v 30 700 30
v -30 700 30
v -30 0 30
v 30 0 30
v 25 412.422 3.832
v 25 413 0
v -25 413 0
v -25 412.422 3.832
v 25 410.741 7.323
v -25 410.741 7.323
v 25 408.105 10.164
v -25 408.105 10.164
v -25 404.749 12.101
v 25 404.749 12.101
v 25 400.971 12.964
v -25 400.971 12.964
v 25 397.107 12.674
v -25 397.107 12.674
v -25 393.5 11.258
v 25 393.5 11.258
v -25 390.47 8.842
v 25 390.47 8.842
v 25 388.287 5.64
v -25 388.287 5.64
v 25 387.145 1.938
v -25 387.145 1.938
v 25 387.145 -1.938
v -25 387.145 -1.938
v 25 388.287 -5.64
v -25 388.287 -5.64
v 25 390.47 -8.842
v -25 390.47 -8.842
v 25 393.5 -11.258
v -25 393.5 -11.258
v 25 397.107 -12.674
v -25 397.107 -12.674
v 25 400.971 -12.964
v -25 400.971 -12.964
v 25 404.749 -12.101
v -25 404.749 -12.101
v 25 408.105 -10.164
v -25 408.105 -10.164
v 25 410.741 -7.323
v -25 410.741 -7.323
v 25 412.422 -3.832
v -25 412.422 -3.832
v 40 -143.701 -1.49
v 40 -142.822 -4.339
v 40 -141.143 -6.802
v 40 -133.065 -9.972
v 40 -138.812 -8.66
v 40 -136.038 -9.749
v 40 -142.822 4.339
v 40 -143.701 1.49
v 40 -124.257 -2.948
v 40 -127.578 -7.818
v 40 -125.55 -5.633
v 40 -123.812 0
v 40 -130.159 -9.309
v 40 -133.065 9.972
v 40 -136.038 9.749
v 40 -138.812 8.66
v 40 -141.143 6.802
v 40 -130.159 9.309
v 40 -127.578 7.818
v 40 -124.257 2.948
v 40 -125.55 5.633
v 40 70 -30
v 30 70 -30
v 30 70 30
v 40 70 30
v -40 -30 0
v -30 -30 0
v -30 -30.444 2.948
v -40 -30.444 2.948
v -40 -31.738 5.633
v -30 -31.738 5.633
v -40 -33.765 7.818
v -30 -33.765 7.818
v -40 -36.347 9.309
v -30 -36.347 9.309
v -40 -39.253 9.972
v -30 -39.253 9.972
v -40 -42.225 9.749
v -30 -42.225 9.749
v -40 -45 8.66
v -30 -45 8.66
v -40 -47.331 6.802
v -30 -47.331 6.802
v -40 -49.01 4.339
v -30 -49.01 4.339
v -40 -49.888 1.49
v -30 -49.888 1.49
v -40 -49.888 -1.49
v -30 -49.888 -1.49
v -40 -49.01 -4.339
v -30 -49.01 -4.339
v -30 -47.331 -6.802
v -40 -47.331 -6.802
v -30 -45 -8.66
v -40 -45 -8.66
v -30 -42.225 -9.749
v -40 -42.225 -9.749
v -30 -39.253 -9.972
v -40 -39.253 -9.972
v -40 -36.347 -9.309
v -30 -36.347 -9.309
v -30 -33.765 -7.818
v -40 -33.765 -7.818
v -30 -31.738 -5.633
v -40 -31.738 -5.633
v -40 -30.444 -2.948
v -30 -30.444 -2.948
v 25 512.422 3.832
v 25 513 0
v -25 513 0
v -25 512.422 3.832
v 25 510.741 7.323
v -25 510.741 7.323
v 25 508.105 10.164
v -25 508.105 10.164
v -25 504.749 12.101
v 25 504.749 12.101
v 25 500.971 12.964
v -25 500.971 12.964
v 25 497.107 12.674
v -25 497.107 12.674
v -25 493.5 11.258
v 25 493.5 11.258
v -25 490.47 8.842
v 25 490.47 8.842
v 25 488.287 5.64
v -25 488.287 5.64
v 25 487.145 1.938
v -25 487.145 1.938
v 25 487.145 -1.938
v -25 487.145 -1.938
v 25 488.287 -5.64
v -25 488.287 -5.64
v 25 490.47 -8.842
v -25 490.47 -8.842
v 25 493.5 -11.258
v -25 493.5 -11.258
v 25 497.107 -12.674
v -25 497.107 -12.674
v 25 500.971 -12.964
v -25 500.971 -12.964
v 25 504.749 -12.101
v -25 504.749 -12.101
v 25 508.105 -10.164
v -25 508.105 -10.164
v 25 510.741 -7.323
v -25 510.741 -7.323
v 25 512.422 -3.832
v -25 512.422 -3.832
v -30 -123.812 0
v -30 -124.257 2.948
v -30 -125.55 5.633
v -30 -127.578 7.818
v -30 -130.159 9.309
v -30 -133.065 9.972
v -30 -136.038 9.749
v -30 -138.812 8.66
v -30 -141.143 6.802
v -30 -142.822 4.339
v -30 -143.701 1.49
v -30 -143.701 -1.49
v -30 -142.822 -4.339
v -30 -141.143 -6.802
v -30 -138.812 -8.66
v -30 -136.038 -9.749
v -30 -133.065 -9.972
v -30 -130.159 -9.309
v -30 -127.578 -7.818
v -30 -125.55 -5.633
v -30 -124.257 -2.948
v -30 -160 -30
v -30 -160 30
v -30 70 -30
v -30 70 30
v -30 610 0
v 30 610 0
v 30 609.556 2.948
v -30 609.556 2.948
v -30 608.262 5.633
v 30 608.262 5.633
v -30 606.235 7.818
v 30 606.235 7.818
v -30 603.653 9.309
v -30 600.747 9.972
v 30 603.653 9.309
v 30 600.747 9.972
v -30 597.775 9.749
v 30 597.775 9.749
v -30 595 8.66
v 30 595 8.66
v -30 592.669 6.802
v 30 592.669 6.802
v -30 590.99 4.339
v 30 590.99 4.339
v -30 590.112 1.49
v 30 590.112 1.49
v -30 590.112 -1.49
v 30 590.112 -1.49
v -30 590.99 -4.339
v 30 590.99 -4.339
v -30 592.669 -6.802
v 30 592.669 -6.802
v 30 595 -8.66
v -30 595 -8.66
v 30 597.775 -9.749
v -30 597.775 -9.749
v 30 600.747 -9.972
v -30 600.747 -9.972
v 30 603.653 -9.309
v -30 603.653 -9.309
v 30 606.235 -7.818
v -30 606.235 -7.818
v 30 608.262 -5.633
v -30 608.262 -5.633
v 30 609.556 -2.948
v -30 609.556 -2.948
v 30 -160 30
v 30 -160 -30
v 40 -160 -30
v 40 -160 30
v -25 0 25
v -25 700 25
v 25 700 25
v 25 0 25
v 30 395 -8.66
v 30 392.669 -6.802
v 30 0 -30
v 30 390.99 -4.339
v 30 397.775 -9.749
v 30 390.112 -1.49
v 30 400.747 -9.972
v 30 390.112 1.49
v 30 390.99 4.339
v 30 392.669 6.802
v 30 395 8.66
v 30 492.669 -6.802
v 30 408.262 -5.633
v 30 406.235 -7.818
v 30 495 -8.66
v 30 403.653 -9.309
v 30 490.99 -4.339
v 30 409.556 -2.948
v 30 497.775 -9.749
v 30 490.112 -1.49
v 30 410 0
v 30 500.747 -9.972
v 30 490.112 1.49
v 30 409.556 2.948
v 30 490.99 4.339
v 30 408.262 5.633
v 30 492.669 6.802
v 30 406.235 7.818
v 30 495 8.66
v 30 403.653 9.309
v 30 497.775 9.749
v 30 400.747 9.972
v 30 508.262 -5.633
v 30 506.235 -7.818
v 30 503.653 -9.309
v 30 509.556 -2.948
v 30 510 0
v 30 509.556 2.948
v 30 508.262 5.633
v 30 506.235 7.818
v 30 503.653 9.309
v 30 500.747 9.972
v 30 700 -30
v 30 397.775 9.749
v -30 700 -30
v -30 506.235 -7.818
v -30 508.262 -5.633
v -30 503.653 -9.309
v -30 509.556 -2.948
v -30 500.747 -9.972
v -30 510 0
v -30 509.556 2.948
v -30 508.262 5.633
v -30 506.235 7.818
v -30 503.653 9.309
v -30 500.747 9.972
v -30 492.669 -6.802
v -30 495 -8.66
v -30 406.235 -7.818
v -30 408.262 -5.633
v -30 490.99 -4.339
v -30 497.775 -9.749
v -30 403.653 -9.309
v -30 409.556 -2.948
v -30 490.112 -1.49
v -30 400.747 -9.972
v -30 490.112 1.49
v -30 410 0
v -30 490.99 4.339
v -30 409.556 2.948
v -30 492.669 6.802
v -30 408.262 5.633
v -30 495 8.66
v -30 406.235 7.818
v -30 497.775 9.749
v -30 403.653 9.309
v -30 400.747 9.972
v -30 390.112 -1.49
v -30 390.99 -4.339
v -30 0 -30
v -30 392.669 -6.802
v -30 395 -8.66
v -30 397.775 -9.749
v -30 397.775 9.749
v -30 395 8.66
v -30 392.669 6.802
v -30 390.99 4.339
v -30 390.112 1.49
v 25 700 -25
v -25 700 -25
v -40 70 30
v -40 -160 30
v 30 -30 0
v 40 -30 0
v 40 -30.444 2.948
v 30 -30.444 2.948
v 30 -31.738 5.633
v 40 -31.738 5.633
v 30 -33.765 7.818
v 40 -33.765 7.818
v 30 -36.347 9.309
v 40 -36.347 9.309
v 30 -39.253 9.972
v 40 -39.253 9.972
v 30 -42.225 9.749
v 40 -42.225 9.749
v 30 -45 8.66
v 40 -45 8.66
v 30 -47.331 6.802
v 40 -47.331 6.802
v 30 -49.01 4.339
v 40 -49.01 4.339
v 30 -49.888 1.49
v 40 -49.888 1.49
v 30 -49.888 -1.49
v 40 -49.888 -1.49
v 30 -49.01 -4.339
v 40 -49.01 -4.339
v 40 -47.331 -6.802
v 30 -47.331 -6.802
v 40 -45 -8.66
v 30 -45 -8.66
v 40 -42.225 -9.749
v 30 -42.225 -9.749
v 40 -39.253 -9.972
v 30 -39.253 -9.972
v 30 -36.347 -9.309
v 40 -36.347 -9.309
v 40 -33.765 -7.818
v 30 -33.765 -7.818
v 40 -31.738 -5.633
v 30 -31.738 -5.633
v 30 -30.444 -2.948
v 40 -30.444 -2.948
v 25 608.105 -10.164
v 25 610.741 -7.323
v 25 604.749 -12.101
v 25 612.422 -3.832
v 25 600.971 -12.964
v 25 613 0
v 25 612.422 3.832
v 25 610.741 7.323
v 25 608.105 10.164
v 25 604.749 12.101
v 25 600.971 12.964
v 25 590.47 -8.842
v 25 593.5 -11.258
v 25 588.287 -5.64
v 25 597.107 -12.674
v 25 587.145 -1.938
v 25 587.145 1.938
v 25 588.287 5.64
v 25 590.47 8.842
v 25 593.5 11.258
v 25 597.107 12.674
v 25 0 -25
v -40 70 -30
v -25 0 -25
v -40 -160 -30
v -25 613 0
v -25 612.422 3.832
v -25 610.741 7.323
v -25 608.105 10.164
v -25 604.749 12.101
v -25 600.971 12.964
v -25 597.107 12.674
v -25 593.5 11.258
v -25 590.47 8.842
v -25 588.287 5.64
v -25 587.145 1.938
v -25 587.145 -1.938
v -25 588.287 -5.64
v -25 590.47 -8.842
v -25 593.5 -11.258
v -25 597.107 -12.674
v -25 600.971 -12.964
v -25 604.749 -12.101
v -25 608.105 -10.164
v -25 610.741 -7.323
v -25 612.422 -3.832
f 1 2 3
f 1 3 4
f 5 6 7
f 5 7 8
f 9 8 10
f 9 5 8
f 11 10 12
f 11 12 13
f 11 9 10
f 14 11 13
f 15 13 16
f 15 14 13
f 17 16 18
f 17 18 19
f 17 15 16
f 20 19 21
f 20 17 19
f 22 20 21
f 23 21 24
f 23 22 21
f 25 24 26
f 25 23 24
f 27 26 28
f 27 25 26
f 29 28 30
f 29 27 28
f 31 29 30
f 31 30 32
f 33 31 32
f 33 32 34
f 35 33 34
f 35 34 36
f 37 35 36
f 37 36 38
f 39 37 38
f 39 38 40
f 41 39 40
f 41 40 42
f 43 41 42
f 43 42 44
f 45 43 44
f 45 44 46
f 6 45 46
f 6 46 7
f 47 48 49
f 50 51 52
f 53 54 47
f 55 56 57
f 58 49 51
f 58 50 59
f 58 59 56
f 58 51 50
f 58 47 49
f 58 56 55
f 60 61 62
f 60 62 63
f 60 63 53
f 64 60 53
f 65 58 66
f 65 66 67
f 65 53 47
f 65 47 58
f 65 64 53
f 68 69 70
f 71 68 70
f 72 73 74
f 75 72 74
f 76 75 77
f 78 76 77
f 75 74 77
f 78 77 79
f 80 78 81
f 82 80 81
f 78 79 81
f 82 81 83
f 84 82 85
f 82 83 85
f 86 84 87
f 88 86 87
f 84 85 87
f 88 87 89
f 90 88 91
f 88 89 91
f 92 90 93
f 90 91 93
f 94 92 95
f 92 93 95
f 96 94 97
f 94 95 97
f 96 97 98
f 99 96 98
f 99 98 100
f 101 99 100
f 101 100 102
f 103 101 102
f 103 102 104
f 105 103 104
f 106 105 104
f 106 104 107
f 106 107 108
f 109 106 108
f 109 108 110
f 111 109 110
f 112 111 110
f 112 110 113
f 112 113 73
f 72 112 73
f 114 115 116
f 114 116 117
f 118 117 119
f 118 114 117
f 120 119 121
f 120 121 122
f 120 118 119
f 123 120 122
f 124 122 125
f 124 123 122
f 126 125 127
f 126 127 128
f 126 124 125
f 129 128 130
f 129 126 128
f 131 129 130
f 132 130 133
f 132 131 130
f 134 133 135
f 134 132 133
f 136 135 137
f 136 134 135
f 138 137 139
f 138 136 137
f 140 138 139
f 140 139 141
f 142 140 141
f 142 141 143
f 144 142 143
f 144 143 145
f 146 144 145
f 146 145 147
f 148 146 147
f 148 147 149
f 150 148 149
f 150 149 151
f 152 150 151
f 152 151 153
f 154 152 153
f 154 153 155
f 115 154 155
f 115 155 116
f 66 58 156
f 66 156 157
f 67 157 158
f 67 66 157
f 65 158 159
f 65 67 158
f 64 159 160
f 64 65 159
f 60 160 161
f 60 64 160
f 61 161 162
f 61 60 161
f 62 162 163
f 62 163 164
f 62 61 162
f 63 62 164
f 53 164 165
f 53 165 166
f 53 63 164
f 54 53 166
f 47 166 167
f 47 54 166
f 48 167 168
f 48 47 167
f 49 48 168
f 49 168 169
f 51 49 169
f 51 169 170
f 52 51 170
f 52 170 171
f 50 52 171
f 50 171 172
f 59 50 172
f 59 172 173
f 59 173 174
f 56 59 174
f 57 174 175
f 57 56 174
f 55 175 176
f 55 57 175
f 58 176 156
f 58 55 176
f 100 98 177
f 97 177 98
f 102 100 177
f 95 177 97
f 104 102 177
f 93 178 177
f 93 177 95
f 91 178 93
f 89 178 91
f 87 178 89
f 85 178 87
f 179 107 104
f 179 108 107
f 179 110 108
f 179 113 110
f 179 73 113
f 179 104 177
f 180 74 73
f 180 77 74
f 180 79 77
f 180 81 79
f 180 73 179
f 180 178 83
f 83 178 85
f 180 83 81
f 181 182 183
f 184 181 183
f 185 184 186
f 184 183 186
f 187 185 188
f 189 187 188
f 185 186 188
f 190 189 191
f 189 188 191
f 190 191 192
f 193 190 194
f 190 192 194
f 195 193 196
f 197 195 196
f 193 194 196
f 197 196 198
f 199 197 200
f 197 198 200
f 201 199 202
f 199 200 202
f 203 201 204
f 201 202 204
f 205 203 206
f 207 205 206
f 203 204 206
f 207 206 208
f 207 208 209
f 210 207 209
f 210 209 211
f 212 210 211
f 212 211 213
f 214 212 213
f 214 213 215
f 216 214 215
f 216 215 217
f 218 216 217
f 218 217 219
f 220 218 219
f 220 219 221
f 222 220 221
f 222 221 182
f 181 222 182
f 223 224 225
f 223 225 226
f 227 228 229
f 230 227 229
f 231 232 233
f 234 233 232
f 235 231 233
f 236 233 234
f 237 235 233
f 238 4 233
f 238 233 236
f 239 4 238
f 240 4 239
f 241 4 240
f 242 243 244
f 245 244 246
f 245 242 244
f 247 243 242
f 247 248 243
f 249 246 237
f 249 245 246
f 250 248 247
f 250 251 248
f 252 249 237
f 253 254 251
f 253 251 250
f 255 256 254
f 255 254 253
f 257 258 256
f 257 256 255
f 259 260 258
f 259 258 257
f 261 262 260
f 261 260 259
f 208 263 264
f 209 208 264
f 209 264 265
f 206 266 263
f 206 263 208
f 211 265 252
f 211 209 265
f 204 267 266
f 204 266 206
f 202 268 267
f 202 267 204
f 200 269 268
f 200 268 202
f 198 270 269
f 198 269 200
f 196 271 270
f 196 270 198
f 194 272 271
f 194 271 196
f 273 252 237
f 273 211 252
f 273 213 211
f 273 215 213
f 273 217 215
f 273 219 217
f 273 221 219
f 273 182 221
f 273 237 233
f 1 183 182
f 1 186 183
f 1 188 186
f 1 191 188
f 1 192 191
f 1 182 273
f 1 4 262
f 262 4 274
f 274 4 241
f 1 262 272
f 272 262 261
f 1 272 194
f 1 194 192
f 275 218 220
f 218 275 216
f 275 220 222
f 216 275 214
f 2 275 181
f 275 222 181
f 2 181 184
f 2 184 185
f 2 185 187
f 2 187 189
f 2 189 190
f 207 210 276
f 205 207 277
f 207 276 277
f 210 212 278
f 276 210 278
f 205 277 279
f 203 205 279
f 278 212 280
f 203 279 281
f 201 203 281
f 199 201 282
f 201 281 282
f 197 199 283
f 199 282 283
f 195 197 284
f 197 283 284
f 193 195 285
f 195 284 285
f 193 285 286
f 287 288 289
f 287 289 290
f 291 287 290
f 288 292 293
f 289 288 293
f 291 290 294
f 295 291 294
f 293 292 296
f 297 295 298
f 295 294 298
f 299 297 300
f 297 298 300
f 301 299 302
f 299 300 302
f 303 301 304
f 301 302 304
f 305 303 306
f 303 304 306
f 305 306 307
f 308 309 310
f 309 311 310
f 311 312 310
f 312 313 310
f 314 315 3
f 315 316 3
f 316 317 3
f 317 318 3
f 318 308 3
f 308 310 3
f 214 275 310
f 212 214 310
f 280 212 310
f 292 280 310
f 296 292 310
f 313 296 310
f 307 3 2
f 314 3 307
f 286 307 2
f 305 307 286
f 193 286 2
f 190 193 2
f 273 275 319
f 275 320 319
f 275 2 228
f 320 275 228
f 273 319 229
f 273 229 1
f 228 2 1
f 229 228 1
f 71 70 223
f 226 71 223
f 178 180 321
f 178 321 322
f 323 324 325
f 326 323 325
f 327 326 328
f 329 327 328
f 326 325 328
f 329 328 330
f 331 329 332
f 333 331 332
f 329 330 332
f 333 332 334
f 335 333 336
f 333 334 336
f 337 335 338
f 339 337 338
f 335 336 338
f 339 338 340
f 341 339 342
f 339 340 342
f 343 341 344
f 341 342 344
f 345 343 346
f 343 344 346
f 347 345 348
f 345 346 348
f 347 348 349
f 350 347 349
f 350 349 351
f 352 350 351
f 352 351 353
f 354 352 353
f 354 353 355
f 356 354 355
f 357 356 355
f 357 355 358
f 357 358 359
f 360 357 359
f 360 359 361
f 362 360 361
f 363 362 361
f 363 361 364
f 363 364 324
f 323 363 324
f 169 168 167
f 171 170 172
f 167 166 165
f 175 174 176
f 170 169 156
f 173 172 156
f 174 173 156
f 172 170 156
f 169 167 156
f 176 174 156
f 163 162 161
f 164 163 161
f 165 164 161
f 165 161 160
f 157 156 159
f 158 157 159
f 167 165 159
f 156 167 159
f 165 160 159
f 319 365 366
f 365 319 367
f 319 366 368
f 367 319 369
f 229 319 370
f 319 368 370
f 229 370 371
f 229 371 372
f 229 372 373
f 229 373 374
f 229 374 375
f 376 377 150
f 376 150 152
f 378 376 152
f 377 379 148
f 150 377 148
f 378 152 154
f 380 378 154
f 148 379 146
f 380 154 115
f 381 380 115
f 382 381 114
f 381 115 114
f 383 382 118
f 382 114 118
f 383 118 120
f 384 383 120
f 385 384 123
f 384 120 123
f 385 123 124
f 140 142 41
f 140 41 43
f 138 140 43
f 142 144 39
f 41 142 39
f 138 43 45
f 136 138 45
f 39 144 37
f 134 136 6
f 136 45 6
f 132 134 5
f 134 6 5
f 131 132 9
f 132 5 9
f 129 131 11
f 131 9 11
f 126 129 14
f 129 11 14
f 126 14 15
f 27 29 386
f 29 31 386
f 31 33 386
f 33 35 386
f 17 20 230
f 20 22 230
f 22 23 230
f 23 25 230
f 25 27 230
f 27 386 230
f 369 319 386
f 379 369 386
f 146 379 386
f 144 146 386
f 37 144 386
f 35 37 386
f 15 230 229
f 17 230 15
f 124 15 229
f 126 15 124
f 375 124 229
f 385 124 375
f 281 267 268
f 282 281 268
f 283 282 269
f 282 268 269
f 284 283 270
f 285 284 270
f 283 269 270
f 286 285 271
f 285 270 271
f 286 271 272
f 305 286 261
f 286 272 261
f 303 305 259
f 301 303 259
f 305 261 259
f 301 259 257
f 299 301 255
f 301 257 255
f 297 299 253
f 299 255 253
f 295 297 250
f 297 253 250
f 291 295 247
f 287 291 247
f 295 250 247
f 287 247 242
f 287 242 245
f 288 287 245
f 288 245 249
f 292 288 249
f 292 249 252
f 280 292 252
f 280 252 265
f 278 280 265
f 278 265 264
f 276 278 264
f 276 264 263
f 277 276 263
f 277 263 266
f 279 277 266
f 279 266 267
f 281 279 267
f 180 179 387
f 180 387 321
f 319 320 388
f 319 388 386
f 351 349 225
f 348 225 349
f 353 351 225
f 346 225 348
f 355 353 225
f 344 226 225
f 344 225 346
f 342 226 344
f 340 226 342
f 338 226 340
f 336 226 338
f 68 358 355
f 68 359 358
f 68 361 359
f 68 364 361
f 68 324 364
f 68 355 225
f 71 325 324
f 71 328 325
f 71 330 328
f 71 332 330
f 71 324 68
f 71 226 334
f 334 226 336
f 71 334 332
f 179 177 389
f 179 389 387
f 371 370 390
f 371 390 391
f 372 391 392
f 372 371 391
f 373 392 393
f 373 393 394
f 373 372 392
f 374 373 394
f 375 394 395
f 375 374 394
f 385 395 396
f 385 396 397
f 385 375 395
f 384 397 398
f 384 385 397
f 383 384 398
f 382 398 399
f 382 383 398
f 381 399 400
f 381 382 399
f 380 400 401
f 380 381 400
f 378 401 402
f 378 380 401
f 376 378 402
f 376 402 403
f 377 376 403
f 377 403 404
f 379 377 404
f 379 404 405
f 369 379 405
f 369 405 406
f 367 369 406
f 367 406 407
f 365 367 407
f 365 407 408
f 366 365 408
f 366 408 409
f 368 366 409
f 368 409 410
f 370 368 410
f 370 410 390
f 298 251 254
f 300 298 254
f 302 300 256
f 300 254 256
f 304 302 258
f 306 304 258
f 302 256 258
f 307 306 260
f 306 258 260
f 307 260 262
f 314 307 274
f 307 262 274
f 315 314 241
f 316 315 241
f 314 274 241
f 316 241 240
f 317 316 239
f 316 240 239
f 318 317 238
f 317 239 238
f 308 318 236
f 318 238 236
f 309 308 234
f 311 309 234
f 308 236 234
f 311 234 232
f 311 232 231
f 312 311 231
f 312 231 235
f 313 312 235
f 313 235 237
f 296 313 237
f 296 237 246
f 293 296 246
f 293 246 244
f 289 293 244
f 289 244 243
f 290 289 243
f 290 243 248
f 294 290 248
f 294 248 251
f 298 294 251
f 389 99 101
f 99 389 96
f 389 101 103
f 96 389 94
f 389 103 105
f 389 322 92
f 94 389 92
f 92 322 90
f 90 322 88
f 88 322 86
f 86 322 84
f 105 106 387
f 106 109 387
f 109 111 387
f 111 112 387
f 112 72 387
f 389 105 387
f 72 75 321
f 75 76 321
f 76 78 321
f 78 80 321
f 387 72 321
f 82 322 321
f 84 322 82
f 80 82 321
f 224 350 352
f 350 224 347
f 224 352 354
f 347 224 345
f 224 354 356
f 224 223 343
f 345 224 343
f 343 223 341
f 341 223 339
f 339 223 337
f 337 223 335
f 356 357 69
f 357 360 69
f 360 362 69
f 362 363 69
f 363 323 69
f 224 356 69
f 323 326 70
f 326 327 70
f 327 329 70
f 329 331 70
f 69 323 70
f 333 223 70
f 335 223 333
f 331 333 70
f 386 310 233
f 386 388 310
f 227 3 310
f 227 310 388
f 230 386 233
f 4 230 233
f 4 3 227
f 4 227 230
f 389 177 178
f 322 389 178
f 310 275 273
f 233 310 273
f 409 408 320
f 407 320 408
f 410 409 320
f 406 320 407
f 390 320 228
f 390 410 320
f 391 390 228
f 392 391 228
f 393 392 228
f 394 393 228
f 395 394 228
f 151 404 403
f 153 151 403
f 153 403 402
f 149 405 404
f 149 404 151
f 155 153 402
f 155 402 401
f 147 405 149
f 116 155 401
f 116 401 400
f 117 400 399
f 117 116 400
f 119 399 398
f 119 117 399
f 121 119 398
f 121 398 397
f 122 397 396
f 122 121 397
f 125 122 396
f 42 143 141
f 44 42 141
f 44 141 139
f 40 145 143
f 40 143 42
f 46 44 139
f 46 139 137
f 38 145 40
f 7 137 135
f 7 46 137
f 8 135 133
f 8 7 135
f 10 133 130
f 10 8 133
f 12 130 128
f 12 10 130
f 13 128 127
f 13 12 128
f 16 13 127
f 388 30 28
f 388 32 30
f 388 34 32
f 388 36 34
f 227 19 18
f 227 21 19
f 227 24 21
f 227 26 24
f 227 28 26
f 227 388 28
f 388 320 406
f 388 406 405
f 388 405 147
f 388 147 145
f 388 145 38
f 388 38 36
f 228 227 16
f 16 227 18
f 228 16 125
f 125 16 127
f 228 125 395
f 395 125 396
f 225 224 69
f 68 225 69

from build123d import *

# Parameters (mm, degrees)
F0_W      = 60
F0_H      = 60
F0_W_2    = 50
F0_H_2    = 50
F1_DEPTH  = 700
F2_W      = 160
F2_H      = 60
F2_W_2    = 70
F3_DEPTH  = 10
F4_R      = 10
F6_DEPTH  = 70
F7_R      = 13
F7_R_2    = 10
F8_DEPTH  = 60
F9_DEPTH  = 70.001
F10_R     = 10
F11_DEPTH = 80.001


with BuildPart() as f1:
    # F0 (on Front) → F1 (new body)
    with BuildSketch(Plane.XZ):
        Rectangle(F0_W, F0_H)
        Rectangle(F0_W_2, F0_H_2, mode=Mode.SUBTRACT)
    extrude(amount=-F1_DEPTH)

    # F7 (on face) → F8 (join, through all)
    with BuildSketch(Plane.YZ.offset(30)):
        with Locations((400, 0)):
            Circle(F7_R)
        with Locations((400, 0)):
            Circle(F7_R_2, mode=Mode.SUBTRACT)
        with Locations((500, 0)):
            Circle(F7_R)
        with Locations((500, 0)):
            Circle(F7_R_2, mode=Mode.SUBTRACT)
        with Locations((600, 0)):
            Circle(F7_R)
        with Locations((600, 0)):
            Circle(F7_R_2, mode=Mode.SUBTRACT)
    extrude(amount=-F8_DEPTH)

    # F7 (on face) → F9 (cut, through all)
    with BuildSketch(Plane.YZ.offset(30)):
        with Locations((600, 0)):
            Circle(F7_R_2)
        with Locations((500, 0)):
            Circle(F7_R_2)
        with Locations((400, 0)):
            Circle(F7_R_2)
    extrude(amount=-F9_DEPTH, mode=Mode.SUBTRACT)


with BuildPart() as f3:
    # F2 (on face) → F3 (new body)
    with BuildSketch(Plane.YZ.offset(30)):
        with Locations((-80, 0)):
            Rectangle(F2_W, F2_H)
        with Locations((35, 0)):
            Rectangle(F2_W_2, F2_H)
    extrude(amount=F3_DEPTH)


with BuildPart() as f5_1:
    # F5: instance of F3
    add(f3.part.mirror(Plane.YZ))


with BuildPart() as f6:
    # F4 (on face) → F6 (new body, through all)
    with BuildSketch(Plane.YZ.offset(40)):
        with Locations((-133.8124871254, 0)):
            Circle(F4_R)
    extrude(amount=-F6_DEPTH)


with BuildPart() as f11_tool:
    # F10 (on face) → F11 (new body, through all)
    with BuildSketch(Plane.YZ.offset(40)):
        with Locations((-40, 0)):
            Circle(F10_R)
    extrude(amount=-F11_DEPTH)


with BuildPart() as f3_1:
    add(f3.part)

    # F11: cut by f11_tool
    add(f11_tool.part, mode=Mode.SUBTRACT)


with BuildPart() as f5_1_1:
    add(f5_1.part)

    # F11: cut by f11_tool
    add(f11_tool.part, mode=Mode.SUBTRACT)


solid = Compound([f1.part, f6.part, f3_1.part, f5_1_1.part])
